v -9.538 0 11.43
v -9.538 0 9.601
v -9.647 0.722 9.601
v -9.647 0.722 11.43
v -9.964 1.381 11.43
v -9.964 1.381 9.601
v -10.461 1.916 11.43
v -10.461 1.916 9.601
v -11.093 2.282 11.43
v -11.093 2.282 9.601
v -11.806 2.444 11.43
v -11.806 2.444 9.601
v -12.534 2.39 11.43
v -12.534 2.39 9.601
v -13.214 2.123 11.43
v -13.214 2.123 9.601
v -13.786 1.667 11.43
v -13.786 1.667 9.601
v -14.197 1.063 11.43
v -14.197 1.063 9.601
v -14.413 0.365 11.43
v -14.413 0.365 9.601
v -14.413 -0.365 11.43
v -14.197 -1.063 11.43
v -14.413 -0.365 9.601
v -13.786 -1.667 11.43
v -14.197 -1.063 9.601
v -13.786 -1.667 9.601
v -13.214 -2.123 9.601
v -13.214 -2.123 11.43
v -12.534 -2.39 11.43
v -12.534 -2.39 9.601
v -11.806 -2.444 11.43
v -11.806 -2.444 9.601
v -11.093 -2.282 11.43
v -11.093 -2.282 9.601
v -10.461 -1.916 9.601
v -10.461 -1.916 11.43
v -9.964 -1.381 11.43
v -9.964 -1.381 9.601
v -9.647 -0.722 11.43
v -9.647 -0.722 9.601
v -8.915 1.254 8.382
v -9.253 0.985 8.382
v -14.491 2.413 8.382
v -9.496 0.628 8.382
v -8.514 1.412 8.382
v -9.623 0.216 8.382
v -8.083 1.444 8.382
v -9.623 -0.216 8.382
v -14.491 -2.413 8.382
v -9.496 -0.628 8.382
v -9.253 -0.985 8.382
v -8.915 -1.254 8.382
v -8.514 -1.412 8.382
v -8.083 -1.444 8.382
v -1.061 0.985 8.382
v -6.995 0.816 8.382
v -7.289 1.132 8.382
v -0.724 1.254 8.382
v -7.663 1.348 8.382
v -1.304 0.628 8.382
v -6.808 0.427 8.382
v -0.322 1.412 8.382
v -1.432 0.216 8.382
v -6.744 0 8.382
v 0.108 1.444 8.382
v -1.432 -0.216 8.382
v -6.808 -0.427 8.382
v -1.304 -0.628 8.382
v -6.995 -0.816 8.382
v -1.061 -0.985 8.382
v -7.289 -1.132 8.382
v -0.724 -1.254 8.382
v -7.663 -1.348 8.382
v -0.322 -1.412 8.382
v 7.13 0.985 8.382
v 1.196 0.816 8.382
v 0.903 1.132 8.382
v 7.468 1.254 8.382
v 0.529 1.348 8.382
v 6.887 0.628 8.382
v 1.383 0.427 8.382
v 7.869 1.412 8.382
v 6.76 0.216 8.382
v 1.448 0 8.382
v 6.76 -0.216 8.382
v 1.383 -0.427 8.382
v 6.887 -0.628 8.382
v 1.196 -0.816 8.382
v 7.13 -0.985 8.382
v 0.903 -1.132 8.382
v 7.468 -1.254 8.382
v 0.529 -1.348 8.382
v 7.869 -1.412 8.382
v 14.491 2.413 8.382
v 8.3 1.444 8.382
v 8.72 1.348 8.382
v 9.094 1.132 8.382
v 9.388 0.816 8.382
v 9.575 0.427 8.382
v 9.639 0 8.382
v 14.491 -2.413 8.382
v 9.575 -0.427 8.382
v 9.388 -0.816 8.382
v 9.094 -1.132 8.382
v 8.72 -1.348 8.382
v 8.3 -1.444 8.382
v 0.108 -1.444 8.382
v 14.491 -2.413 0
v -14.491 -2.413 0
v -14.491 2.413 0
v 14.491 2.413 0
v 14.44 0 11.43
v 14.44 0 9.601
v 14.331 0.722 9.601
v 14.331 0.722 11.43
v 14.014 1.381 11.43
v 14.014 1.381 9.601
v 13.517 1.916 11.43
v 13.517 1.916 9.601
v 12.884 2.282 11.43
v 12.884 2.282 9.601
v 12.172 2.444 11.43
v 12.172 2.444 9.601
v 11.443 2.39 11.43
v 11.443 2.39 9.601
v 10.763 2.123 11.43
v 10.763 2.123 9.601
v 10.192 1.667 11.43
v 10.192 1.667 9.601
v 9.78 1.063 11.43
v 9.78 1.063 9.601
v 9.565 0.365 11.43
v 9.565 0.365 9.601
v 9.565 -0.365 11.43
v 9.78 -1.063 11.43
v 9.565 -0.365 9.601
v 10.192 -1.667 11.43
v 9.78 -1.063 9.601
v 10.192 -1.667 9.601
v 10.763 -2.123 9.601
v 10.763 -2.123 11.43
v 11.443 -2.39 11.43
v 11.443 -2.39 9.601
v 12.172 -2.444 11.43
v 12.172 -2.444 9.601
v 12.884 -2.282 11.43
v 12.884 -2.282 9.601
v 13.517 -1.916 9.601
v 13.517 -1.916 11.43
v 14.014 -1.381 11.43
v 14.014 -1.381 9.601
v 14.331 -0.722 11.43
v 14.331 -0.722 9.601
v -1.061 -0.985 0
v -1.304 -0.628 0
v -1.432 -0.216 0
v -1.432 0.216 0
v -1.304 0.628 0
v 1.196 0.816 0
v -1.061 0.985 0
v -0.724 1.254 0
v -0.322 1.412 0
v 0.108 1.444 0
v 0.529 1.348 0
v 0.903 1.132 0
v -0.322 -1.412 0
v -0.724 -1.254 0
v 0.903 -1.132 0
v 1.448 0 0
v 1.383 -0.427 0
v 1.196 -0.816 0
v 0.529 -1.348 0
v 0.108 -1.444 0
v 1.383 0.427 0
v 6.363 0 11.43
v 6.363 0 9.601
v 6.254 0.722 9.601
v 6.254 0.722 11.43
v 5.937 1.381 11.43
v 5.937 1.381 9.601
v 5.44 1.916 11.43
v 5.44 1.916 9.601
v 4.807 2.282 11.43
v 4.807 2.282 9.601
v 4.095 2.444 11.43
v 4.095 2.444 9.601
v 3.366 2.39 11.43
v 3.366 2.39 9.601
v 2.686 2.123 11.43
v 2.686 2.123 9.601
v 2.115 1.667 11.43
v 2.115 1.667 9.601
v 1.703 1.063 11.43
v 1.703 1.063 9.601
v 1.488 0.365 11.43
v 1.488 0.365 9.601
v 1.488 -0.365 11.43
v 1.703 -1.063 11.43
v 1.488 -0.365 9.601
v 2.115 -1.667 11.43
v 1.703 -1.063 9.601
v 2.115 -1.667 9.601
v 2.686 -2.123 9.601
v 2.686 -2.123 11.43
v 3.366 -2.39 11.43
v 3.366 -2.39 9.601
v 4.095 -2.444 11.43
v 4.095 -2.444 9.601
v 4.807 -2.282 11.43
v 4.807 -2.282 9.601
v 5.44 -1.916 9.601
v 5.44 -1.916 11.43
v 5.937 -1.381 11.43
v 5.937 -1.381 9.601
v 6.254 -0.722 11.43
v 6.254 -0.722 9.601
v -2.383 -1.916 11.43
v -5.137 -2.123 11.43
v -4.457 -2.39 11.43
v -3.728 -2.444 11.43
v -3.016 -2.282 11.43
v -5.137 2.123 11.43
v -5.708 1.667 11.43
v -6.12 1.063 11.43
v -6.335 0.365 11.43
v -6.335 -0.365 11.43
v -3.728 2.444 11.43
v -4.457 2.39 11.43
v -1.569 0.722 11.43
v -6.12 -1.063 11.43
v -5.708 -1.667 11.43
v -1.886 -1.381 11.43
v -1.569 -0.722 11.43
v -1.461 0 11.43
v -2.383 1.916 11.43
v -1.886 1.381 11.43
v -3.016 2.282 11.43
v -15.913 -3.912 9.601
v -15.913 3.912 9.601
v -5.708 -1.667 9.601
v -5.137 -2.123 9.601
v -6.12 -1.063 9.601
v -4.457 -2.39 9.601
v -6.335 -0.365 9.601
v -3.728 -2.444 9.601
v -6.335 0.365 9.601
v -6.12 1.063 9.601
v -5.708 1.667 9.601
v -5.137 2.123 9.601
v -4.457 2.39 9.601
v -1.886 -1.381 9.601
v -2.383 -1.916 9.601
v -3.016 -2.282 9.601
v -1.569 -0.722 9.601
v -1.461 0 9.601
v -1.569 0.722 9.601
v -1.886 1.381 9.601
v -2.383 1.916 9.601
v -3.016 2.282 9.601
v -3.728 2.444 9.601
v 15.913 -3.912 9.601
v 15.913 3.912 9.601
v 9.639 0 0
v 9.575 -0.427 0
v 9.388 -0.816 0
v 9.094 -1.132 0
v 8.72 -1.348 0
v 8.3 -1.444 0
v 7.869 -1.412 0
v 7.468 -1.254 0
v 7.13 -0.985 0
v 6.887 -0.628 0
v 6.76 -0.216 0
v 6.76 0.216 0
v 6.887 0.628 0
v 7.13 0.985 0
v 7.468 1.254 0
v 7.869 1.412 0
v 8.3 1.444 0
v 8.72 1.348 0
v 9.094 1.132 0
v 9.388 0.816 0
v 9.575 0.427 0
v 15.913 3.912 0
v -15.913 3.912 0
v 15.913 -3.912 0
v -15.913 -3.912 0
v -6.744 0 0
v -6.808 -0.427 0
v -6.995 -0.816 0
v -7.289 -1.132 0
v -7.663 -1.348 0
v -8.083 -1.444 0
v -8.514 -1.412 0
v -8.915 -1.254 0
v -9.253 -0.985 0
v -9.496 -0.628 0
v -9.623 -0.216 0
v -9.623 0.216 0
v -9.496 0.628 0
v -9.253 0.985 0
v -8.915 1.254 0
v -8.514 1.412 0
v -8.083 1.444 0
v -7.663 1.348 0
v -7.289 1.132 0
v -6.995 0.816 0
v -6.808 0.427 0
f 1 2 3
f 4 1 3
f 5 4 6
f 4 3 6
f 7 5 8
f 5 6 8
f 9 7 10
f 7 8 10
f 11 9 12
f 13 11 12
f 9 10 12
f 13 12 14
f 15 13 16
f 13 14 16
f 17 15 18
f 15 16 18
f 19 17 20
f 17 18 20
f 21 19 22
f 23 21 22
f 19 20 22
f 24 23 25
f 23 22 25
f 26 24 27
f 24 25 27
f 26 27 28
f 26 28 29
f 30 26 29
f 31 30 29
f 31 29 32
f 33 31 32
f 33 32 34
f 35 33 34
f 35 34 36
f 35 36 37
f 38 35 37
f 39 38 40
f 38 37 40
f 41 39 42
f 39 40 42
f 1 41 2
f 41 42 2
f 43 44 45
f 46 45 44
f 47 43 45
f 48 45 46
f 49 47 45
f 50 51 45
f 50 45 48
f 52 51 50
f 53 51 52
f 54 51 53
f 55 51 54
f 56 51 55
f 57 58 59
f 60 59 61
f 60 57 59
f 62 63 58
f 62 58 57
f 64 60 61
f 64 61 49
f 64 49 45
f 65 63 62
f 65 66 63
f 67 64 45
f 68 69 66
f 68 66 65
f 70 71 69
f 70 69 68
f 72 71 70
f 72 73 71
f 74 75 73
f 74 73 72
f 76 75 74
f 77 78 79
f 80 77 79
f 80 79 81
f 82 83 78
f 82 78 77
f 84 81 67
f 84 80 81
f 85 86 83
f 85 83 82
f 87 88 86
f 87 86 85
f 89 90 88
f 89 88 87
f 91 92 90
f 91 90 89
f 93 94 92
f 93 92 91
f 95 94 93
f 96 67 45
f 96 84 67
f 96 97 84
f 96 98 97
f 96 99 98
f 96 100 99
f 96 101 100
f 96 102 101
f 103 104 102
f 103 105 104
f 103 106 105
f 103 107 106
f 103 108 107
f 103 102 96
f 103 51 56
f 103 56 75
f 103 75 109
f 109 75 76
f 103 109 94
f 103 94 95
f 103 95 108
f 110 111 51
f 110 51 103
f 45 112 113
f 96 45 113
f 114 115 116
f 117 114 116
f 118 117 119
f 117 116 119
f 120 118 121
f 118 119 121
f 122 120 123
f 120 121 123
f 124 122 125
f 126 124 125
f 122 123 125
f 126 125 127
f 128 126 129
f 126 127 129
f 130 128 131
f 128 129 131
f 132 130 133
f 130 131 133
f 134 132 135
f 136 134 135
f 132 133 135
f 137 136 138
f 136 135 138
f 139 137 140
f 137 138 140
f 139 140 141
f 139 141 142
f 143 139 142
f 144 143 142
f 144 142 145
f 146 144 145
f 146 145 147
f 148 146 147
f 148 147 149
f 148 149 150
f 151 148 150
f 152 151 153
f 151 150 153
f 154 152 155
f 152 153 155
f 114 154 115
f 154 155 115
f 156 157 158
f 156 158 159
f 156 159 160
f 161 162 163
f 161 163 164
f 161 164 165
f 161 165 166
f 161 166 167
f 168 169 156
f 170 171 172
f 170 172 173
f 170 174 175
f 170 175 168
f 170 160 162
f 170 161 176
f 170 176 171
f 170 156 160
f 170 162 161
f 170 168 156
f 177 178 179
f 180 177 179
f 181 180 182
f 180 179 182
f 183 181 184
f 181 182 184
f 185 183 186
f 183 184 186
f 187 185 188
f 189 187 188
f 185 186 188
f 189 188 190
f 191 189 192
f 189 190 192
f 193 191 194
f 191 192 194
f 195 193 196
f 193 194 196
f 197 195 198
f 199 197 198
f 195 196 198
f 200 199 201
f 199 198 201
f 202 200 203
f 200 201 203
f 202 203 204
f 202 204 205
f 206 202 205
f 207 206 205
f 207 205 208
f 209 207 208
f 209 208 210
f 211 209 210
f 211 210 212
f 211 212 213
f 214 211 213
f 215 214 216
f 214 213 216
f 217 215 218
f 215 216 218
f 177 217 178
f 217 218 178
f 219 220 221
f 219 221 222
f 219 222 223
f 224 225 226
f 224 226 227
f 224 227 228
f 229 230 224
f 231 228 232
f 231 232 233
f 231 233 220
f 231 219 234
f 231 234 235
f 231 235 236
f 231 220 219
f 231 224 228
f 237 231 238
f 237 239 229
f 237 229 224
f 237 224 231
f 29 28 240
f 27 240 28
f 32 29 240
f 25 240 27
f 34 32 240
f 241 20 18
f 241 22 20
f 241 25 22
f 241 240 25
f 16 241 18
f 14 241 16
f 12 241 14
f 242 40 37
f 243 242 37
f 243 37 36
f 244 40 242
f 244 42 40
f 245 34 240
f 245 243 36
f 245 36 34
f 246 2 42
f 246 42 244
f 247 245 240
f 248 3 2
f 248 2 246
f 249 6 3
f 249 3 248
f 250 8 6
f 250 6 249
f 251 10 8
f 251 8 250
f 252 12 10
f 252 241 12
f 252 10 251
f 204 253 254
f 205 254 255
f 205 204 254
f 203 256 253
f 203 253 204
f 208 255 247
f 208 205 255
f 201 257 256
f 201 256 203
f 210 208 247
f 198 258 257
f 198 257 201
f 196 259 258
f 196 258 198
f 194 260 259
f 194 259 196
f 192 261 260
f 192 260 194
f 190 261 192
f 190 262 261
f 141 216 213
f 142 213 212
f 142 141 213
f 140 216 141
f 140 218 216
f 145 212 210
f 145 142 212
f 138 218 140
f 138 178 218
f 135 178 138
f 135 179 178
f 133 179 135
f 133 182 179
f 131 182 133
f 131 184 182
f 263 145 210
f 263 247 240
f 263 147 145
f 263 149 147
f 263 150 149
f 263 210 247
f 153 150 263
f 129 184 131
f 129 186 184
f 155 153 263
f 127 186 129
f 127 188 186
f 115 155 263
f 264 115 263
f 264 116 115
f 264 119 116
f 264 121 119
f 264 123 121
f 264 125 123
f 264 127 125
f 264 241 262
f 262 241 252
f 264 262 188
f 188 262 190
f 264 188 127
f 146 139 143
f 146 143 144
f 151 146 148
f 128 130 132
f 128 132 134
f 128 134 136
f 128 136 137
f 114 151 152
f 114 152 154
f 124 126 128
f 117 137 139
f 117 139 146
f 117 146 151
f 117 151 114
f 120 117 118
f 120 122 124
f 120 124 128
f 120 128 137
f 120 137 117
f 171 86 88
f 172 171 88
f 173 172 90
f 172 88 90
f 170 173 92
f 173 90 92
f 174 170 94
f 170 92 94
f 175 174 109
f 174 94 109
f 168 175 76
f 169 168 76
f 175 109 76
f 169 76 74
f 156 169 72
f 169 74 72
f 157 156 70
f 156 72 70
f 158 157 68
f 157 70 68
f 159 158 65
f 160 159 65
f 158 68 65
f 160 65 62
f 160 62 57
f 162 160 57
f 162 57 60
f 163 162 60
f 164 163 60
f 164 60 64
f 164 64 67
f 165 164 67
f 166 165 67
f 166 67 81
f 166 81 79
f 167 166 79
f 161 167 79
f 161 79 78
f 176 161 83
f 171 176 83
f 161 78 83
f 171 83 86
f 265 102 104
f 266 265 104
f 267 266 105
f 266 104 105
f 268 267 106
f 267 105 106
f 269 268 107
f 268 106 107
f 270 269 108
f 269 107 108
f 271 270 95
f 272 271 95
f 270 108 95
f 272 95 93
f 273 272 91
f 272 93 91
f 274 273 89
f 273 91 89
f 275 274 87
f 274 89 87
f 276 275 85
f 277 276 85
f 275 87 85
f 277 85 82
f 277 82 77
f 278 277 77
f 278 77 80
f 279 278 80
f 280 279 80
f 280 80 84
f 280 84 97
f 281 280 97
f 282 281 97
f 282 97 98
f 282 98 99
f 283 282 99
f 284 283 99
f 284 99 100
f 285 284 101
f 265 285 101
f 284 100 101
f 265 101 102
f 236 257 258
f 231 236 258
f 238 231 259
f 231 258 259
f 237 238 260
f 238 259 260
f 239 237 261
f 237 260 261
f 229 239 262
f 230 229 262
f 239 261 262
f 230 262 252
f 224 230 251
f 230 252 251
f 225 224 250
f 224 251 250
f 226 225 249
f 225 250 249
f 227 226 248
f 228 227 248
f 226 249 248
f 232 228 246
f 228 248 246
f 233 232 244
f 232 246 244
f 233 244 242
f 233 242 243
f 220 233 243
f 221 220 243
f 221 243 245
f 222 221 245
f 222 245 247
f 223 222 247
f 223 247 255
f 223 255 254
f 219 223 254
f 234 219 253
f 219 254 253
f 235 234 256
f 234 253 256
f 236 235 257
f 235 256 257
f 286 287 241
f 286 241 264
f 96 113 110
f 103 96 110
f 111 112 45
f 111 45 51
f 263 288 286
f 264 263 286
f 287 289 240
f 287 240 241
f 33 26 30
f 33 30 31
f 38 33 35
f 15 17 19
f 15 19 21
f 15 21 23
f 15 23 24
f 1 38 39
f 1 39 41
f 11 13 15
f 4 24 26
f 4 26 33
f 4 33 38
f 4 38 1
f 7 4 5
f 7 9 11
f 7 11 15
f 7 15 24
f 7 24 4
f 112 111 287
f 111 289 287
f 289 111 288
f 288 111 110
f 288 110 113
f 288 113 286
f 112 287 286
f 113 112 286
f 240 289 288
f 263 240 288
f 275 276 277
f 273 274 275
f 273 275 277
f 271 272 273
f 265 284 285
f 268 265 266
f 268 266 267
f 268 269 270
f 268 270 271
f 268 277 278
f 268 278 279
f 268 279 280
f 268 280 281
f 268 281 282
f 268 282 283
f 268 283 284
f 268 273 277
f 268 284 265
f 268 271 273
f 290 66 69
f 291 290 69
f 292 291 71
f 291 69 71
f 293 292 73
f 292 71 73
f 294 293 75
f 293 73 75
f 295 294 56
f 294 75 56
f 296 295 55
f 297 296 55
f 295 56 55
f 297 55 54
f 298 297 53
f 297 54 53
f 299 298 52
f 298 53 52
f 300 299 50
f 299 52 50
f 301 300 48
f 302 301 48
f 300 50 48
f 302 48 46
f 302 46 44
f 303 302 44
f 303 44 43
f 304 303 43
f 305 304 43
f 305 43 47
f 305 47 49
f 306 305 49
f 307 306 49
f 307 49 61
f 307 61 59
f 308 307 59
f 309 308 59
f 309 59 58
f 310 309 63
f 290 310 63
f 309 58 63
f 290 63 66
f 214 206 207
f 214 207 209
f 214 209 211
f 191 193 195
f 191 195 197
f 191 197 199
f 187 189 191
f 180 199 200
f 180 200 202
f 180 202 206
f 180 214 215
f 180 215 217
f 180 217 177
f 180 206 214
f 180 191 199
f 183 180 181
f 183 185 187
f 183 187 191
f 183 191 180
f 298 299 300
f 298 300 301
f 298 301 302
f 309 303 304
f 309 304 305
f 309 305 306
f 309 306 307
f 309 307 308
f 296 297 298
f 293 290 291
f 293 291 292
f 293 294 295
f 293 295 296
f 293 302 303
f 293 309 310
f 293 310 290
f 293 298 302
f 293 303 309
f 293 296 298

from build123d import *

# Parameters (mm, degrees)
F0_W     = 31.8262
F0_H     = 7.8232
F1_DEPTH = 9.6012
F3_R     = 2.4511
F4_DEPTH = 1.8288
F5_W     = 28.9814
F5_H     = 4.826
F6_DEPTH = 8.382
F7_R     = 1.4478
F8_DEPTH = 8.382


with BuildPart() as f1:
    # F0 (on Top) → F1 (new body)
    with BuildSketch(Plane.XY):
        Rectangle(F0_W, F0_H)
    extrude(amount=F1_DEPTH)

    # F3 (on face) → F4 (join)
    with BuildSketch(Plane.XY.offset(9.6012)):
        with Locations((11.9888, 0)):
            Circle(F3_R)
        with Locations((3.9116, 0)):
            Circle(F3_R)
        with Locations((-3.9116, 0)):
            Circle(F3_R)
        with Locations((-11.9888, 0)):
            Circle(F3_R)
    extrude(amount=F4_DEPTH)

    # F5 (on face) → F6 (cut)
    with BuildSketch(Plane(origin=(0, 0, 0), x_dir=(1, 0, 0), z_dir=(0, 0, -1))):
        Rectangle(F5_W, F5_H)
    extrude(amount=-F6_DEPTH, mode=Mode.SUBTRACT)

    # F7 (on face) → F8 (join)
    with BuildSketch(Plane(origin=(0, 0, 8.382), x_dir=(1, 0, 0), z_dir=(0, 0, -1))):
        with Locations((-8.1915, 0)):
            Circle(F7_R)
        Circle(F7_R)
        with Locations((8.1915, 0)):
            Circle(F7_R)
    extrude(amount=F8_DEPTH)


solid = f1.part
